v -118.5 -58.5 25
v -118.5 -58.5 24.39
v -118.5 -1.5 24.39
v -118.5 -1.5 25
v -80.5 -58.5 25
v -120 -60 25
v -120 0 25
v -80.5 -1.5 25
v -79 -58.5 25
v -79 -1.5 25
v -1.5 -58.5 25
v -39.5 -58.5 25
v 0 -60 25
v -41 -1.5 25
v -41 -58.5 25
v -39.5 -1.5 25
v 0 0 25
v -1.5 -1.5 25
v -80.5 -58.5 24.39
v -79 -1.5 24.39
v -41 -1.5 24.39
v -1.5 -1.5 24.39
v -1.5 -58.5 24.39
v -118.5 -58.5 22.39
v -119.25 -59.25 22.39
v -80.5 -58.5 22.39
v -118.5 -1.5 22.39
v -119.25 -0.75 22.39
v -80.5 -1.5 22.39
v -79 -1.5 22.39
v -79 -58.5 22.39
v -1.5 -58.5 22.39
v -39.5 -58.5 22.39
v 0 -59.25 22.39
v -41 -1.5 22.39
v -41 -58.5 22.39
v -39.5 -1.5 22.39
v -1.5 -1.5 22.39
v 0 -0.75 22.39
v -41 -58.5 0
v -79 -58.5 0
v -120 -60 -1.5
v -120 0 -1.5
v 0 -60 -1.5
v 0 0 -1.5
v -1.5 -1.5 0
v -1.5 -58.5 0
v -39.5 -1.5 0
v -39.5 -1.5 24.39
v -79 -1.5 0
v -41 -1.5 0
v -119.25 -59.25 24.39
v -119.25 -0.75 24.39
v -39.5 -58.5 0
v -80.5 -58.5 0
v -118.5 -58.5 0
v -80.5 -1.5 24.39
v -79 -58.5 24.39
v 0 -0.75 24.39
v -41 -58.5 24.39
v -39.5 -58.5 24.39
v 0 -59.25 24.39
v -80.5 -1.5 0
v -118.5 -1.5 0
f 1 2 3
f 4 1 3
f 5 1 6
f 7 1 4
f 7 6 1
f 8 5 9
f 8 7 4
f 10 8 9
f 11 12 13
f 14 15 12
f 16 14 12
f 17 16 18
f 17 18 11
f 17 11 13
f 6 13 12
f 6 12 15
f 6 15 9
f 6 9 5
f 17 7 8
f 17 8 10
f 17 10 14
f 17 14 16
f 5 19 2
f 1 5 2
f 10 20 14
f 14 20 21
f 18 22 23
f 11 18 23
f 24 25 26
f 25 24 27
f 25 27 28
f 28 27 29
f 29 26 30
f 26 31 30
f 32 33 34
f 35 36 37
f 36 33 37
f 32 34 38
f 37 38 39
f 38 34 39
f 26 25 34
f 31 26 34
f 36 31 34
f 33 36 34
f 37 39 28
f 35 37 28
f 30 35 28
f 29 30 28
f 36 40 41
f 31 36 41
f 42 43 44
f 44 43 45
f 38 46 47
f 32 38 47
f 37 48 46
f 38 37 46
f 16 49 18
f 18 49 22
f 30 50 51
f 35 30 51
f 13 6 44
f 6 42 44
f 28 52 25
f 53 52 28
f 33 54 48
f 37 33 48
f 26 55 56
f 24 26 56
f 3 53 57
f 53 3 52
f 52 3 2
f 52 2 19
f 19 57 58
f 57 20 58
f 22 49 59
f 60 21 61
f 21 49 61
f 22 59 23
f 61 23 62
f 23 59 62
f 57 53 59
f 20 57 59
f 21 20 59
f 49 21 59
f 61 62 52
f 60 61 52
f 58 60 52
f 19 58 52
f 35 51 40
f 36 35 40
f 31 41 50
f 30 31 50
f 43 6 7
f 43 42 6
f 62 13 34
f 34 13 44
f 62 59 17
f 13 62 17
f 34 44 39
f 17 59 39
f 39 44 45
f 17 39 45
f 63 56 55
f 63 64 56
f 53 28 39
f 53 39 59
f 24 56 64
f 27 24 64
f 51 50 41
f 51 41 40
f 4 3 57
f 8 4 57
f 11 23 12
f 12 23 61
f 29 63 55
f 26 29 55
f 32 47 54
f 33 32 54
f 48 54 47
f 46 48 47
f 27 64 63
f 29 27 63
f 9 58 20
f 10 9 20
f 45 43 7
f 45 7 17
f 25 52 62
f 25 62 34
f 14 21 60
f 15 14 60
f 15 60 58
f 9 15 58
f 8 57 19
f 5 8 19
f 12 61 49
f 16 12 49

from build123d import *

# Parameters (mm, degrees)
F0_W     = 120
F0_H     = 60
F1_DEPTH = 1.5
F2_DEPTH = 25
F4_DEPTH = 119.25


with BuildPart() as f1:
    # F0 (on Top) → F1 (new body)
    with BuildSketch(Plane.XY):
        with Locations((-60, -30)):
            Rectangle(F0_W, F0_H)
        Polygon((-118.5, -58.5), (-118.5, -30), (-118.5, -1.5), (-80.5, -1.5), (-80.5, -58.5), align=None, mode=Mode.SUBTRACT)
        Polygon((-41, -58.5), (-60, -58.5), (-79, -58.5), (-79, -1.5), (-60, -1.5), (-41, -1.5), align=None, mode=Mode.SUBTRACT)
        Polygon((-1.5, -1.5), (-1.5, -30), (-1.5, -58.5), (-39.5, -58.5), (-39.5, -1.5), align=None, mode=Mode.SUBTRACT)
        Polygon((-118.5, -1.5), (-118.5, -30), (-118.5, -58.5), (-80.5, -58.5), (-80.5, -1.5), align=None)
        Polygon((-79, -58.5), (-60, -58.5), (-41, -58.5), (-41, -1.5), (-60, -1.5), (-79, -1.5), align=None)
        Polygon((-1.5, -58.5), (-1.5, -30), (-1.5, -1.5), (-39.5, -1.5), (-39.5, -58.5), align=None)
    extrude(amount=-F1_DEPTH)

    # F0 (on Top) → F2 (join)
    with BuildSketch(Plane.XY):
        with Locations((-60, -30)):
            Rectangle(F0_W, F0_H)
        Polygon((-118.5, -58.5), (-118.5, -30), (-118.5, -1.5), (-80.5, -1.5), (-80.5, -58.5), align=None, mode=Mode.SUBTRACT)
        Polygon((-41, -58.5), (-60, -58.5), (-79, -58.5), (-79, -1.5), (-60, -1.5), (-41, -1.5), align=None, mode=Mode.SUBTRACT)
        Polygon((-1.5, -1.5), (-1.5, -30), (-1.5, -58.5), (-39.5, -58.5), (-39.5, -1.5), align=None, mode=Mode.SUBTRACT)
    extrude(amount=F2_DEPTH)

    # F3 (on Right) → F4 (cut)
    with BuildSketch(Plane.YZ):
        Polygon((-0.75, 23.390348), (-0.75, 24.390348), (-59.25, 24.390348), (-59.25, 23.390348), (-59.25, 22.390348), (-0.75, 22.390348), align=None)
    extrude(amount=-F4_DEPTH, mode=Mode.SUBTRACT)


solid = f1.part
